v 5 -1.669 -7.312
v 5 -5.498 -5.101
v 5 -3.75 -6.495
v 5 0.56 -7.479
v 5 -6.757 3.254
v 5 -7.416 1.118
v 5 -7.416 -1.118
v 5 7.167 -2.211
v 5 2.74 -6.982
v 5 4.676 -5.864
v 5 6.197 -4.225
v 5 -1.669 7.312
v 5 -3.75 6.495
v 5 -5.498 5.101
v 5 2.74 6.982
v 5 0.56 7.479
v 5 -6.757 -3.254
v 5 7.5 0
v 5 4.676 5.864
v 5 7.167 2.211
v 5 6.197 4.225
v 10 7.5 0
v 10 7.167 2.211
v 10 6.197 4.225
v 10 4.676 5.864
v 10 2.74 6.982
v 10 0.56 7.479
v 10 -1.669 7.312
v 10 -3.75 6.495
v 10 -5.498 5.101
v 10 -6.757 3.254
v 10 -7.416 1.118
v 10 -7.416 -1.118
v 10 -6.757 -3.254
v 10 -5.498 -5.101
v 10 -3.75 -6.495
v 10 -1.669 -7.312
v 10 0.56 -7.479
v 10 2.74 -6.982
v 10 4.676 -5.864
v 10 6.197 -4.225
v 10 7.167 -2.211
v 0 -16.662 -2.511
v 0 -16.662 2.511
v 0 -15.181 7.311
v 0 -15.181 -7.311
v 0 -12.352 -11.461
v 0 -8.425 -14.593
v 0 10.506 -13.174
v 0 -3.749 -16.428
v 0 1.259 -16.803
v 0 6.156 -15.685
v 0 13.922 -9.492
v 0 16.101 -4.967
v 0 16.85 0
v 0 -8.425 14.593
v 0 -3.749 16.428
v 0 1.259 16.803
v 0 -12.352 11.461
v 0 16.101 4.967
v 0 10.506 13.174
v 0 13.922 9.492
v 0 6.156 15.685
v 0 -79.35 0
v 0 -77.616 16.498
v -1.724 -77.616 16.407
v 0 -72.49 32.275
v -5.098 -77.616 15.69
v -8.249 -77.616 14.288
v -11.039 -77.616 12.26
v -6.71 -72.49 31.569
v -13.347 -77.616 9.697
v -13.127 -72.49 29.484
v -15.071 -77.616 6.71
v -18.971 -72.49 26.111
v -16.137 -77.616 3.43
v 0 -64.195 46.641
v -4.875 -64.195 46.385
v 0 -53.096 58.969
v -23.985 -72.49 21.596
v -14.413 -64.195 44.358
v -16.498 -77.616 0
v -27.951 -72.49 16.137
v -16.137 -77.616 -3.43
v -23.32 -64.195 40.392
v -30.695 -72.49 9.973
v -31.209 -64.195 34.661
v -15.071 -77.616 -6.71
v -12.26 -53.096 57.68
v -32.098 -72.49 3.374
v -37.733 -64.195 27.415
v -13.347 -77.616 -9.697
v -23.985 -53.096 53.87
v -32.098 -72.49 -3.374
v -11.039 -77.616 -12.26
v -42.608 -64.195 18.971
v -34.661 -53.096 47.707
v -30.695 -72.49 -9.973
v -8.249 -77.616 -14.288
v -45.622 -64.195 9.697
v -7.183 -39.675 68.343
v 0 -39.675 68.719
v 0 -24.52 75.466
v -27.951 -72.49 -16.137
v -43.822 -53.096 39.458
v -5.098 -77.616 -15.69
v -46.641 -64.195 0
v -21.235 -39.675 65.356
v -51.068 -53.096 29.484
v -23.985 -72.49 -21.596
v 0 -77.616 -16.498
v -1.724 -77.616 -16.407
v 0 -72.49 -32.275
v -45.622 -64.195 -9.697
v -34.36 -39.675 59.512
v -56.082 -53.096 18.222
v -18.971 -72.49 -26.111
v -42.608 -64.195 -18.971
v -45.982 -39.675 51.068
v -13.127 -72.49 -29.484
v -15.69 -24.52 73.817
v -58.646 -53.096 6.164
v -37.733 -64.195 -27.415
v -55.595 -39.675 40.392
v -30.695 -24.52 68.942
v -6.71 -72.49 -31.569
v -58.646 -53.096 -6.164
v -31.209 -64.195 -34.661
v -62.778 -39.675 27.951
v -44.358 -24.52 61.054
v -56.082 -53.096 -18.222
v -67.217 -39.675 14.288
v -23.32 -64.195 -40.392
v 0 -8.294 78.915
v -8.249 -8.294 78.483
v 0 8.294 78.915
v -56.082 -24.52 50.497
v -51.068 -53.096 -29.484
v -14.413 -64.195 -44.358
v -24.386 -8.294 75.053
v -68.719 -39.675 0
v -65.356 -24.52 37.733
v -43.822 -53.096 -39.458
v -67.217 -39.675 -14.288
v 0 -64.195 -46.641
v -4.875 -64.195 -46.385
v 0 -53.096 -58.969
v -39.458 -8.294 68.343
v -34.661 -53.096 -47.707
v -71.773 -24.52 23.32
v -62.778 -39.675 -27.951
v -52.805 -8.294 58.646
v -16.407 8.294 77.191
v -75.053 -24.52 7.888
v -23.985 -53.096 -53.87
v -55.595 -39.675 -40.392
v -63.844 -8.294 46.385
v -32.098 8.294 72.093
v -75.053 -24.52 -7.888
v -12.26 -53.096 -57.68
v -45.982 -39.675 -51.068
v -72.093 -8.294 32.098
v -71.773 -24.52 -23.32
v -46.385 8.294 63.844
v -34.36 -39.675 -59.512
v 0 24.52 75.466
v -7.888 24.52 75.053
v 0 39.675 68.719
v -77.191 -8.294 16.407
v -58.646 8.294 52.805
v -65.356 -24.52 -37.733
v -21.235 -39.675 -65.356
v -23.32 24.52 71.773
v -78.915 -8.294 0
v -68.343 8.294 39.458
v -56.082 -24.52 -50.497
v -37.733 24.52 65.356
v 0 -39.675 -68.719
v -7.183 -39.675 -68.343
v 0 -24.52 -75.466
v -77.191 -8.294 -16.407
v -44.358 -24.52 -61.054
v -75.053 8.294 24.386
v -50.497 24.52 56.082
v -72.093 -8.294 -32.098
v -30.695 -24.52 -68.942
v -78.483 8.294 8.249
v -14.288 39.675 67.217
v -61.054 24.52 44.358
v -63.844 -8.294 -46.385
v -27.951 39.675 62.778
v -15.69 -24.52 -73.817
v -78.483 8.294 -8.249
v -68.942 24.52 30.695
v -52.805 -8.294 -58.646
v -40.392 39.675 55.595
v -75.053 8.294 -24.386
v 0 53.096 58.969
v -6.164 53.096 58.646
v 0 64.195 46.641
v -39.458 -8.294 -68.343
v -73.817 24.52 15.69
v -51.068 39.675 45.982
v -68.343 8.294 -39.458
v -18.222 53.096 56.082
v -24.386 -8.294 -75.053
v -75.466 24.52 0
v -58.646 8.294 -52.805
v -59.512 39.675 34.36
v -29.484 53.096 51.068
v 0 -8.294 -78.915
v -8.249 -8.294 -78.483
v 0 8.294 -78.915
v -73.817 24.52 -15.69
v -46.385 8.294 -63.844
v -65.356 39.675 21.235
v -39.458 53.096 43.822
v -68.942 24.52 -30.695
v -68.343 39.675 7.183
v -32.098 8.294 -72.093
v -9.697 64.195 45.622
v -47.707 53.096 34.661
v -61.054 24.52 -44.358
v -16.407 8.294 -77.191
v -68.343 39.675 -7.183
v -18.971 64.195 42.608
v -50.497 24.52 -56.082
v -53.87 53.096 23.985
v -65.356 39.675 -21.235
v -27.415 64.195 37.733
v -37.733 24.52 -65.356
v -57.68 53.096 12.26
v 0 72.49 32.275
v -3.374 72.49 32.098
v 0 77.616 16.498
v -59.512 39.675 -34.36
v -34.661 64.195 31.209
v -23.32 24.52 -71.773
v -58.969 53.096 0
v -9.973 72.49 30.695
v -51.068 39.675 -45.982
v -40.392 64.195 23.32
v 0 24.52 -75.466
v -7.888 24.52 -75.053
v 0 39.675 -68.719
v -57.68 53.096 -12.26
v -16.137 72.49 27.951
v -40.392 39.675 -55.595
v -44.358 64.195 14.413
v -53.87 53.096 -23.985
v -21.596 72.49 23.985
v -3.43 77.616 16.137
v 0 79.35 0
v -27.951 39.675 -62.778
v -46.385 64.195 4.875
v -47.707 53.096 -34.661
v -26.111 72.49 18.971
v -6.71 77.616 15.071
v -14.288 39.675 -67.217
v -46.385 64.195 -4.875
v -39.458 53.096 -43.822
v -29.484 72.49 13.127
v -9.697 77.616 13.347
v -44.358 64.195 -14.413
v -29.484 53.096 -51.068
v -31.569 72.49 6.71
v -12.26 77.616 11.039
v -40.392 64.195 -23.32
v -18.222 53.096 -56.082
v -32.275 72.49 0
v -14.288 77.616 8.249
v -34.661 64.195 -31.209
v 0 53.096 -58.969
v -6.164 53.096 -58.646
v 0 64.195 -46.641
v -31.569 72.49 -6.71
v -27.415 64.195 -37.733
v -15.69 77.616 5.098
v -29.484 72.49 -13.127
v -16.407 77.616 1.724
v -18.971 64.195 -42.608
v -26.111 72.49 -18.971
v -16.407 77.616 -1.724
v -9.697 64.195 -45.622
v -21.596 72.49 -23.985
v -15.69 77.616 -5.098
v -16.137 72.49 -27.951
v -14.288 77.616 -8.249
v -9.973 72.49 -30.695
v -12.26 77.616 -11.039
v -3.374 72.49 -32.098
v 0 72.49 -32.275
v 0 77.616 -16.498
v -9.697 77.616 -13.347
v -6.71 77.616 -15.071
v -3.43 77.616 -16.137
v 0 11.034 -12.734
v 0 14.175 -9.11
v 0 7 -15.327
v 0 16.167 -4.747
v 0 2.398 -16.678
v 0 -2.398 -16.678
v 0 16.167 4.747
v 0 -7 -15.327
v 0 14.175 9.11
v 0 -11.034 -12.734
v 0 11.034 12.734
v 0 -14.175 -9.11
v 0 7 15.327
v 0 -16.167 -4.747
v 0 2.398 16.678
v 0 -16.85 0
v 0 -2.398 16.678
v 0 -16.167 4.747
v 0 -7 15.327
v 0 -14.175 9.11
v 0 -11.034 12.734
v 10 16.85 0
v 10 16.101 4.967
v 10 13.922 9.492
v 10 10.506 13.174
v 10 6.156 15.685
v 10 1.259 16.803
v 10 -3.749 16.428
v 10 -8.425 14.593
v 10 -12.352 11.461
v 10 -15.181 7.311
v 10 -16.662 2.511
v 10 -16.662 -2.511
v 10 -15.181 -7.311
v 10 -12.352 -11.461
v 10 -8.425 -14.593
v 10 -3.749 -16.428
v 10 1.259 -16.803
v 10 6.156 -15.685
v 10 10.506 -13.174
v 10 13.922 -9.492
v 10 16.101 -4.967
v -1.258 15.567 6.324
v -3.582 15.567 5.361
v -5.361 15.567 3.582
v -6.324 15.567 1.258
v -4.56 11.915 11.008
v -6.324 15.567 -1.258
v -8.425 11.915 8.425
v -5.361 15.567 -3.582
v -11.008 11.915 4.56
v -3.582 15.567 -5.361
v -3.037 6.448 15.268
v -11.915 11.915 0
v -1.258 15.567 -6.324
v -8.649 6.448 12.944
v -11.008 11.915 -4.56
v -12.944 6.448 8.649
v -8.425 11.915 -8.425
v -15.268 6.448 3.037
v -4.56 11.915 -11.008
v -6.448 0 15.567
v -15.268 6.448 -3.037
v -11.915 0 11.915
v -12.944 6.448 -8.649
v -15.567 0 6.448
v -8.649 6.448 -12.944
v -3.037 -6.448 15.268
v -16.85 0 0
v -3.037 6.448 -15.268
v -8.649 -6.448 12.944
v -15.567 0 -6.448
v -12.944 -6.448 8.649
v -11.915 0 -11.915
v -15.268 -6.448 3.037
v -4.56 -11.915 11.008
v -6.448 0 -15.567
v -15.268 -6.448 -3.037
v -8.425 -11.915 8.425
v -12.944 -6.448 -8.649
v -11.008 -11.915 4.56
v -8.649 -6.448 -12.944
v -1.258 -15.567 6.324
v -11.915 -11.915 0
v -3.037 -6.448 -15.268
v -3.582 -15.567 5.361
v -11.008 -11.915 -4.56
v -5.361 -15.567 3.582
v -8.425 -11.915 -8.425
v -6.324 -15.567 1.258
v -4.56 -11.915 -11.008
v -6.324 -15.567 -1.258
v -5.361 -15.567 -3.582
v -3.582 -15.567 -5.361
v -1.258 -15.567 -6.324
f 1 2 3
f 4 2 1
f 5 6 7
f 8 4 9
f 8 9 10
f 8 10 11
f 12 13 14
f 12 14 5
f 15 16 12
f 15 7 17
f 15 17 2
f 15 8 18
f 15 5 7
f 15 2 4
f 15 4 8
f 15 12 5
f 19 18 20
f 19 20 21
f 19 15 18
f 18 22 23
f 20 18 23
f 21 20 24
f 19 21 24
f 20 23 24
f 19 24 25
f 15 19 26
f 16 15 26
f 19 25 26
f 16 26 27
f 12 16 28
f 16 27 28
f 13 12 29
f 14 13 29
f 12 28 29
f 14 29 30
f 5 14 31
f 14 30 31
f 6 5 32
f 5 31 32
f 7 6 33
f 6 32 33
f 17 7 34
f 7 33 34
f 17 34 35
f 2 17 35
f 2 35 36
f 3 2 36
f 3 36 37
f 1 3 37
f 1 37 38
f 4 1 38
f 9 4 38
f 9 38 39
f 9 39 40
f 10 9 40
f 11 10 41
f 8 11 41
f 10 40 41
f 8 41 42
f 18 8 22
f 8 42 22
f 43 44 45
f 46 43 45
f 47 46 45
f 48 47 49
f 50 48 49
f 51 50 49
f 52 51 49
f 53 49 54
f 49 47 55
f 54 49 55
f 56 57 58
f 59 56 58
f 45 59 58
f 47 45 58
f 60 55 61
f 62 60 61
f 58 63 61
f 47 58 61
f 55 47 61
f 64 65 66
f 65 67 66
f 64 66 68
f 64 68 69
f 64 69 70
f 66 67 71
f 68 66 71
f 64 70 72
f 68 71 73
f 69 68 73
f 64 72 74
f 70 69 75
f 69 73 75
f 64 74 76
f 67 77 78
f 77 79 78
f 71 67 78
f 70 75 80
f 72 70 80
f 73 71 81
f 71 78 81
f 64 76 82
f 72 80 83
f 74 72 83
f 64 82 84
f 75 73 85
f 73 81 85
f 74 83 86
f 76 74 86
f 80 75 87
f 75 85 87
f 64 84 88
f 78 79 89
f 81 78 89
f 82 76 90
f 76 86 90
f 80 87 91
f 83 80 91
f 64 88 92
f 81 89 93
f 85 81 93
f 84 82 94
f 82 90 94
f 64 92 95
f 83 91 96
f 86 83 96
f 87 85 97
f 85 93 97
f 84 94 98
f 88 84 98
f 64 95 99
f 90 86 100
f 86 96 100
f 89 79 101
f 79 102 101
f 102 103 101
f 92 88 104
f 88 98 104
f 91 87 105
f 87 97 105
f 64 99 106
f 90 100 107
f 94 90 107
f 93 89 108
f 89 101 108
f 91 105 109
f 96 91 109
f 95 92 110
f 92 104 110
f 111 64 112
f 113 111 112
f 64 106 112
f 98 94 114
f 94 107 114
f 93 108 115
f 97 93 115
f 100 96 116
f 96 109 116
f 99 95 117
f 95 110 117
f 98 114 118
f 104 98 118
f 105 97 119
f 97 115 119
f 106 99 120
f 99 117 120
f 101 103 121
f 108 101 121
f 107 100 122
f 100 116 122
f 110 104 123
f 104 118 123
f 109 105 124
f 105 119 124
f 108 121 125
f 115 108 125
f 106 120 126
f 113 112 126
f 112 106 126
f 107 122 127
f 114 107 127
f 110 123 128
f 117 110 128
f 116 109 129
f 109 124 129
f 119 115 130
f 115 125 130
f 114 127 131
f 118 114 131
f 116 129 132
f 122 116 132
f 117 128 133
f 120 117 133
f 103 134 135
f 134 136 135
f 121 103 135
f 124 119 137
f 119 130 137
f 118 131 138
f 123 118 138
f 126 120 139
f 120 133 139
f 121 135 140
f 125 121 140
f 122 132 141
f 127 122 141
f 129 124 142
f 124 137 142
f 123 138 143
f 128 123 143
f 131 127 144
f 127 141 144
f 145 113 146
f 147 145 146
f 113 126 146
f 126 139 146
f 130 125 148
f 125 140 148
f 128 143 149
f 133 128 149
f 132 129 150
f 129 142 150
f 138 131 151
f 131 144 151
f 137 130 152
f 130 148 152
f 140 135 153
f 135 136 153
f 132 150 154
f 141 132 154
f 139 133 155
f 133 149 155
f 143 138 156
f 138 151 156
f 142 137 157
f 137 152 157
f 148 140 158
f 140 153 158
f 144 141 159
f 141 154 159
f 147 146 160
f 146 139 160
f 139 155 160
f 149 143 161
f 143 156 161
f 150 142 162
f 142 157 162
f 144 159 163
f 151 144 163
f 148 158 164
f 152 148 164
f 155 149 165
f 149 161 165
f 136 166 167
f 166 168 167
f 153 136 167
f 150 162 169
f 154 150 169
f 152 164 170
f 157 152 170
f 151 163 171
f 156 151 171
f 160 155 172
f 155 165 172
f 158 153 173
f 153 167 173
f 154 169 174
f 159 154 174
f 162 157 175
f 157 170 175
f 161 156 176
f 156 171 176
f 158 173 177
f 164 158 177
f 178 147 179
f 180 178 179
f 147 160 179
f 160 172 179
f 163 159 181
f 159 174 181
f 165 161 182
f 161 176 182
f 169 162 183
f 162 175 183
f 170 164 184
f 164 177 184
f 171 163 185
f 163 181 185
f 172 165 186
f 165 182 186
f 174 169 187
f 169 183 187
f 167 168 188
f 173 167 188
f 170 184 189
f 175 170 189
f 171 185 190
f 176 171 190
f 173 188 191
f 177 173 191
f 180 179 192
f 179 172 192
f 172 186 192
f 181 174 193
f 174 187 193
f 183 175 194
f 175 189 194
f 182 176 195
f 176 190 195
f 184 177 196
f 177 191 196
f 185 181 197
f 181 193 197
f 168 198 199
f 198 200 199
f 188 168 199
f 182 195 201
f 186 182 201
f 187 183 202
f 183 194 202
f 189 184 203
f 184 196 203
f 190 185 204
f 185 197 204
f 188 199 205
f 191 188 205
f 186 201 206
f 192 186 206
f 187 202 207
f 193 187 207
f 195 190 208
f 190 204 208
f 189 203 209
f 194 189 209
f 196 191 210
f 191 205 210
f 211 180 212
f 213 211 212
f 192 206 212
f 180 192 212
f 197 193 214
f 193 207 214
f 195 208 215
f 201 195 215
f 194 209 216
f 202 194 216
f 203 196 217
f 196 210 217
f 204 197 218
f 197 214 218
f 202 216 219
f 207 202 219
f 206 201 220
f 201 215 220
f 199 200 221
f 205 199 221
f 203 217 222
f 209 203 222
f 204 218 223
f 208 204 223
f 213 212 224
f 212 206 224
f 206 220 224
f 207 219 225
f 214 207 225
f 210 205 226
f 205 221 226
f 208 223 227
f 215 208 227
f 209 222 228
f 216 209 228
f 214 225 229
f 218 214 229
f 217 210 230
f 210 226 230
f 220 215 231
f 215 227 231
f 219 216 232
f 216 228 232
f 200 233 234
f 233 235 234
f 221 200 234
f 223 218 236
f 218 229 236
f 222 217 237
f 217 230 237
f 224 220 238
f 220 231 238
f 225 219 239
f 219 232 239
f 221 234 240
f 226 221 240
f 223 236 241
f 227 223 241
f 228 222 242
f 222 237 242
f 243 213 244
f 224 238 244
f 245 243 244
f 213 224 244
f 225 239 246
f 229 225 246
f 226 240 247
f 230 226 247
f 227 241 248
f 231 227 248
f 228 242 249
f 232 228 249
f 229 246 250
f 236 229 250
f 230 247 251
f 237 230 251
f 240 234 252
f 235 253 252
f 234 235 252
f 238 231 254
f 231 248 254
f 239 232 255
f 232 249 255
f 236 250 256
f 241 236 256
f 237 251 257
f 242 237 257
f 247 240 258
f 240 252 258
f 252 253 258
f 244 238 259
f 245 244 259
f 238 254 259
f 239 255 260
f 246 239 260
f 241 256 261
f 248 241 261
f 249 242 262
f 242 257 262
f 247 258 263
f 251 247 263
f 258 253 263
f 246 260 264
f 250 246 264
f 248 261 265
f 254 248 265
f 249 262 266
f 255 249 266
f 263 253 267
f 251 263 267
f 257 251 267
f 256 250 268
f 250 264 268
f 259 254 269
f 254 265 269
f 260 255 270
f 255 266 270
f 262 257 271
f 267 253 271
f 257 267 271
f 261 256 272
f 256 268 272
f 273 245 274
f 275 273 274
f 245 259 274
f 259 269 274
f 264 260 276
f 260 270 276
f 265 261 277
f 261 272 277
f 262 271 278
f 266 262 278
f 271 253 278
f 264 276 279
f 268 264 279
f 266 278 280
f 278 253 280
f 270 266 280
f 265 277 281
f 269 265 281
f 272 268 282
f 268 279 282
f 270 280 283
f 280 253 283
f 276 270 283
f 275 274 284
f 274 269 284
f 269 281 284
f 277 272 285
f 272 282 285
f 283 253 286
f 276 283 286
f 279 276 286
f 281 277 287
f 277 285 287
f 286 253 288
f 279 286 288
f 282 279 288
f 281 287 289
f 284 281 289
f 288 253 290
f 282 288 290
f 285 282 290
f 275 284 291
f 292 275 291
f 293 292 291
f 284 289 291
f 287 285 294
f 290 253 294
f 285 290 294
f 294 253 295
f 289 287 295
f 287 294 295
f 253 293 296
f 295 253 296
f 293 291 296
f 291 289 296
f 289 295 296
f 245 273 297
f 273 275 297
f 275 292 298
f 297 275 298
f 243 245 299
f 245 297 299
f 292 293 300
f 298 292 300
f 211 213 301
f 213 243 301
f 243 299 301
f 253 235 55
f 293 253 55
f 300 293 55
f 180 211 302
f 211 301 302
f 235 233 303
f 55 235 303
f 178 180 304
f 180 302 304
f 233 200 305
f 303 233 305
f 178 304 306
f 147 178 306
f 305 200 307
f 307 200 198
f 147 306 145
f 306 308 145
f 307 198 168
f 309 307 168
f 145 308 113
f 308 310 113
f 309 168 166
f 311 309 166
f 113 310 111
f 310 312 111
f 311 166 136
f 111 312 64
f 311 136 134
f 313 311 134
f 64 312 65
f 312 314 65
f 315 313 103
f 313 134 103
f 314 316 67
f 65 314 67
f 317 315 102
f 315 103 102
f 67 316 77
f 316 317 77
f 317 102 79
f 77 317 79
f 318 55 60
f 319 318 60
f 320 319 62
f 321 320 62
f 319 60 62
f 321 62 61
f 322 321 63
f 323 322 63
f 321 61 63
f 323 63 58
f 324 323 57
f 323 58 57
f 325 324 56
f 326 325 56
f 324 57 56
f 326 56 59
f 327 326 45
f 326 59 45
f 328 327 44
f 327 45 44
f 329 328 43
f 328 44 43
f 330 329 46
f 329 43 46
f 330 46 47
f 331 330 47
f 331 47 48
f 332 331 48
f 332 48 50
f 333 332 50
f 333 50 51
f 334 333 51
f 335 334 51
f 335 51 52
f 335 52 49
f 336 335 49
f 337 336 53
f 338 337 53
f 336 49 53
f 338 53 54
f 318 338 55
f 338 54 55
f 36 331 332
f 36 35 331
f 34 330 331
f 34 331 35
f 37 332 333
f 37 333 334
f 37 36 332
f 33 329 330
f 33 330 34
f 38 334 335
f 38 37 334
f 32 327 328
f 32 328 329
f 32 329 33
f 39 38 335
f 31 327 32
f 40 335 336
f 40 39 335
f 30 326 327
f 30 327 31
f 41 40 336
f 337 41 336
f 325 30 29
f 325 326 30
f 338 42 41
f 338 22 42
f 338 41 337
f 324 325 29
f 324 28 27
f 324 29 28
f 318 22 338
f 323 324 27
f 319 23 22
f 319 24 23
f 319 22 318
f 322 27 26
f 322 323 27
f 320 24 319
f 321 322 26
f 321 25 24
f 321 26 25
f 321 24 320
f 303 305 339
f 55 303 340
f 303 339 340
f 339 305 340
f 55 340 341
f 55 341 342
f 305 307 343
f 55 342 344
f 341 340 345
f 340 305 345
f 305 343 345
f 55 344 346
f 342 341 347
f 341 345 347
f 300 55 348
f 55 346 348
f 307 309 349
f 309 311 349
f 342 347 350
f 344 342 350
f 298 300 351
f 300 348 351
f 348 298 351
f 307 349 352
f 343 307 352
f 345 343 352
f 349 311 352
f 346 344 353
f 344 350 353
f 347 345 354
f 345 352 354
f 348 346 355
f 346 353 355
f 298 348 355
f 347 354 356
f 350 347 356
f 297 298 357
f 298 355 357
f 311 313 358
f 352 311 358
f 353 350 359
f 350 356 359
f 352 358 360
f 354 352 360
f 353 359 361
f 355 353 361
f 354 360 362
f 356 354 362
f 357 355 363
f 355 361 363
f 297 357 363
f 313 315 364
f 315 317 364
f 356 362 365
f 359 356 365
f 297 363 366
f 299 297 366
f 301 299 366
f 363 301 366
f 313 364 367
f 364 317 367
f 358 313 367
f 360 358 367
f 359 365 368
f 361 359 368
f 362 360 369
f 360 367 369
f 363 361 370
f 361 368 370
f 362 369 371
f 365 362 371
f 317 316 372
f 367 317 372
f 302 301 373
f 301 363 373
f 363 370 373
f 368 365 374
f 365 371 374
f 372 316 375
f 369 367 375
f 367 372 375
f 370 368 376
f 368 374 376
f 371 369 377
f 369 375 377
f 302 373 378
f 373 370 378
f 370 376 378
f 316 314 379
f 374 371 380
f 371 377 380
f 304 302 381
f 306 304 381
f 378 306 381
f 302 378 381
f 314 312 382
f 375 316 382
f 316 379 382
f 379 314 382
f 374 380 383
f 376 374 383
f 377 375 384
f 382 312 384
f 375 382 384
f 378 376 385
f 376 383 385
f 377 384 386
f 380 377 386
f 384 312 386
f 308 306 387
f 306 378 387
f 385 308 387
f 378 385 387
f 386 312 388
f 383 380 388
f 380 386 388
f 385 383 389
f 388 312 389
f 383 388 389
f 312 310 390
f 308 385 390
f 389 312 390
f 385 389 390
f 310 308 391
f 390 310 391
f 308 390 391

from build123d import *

# Parameters (mm, degrees)
F0_R     = 16.85
F1_DEPTH = 10
F2_R     = 7.5
F3_DEPTH = 5
F5_ANGLE = 180


with BuildPart() as f1:
    # F0 (on Right) → F1 (new body)
    with BuildSketch(Plane.YZ):
        Circle(F0_R)
    extrude(amount=F1_DEPTH)

    # F2 (on face) → F3 (cut)
    with BuildSketch(Plane.YZ.offset(10)):
        Circle(F2_R)
    extrude(amount=-F3_DEPTH, mode=Mode.SUBTRACT)


with BuildPart() as f5:
    # F4 (on face) → F5 (revolve)
    with BuildSketch(Plane(origin=(0, 0, 0), x_dir=(0, -1, 0), z_dir=(-1, 0, 0))):
        with BuildLine():
            Line((16.85, 0), (79.35, 0))
            ThreePointArc((79.35, 0), (0, 79.35), (-79.35, 0))
            Line((-79.35, 0), (-16.85, 0))
            ThreePointArc((-16.85, 0), (0, 16.85), (16.85, 0))
        make_face()
    revolve(axis=Axis((0, 0, 0), (0, -1, 0)), revolution_arc=F5_ANGLE)


solid = Compound([f1.part, f5.part])
